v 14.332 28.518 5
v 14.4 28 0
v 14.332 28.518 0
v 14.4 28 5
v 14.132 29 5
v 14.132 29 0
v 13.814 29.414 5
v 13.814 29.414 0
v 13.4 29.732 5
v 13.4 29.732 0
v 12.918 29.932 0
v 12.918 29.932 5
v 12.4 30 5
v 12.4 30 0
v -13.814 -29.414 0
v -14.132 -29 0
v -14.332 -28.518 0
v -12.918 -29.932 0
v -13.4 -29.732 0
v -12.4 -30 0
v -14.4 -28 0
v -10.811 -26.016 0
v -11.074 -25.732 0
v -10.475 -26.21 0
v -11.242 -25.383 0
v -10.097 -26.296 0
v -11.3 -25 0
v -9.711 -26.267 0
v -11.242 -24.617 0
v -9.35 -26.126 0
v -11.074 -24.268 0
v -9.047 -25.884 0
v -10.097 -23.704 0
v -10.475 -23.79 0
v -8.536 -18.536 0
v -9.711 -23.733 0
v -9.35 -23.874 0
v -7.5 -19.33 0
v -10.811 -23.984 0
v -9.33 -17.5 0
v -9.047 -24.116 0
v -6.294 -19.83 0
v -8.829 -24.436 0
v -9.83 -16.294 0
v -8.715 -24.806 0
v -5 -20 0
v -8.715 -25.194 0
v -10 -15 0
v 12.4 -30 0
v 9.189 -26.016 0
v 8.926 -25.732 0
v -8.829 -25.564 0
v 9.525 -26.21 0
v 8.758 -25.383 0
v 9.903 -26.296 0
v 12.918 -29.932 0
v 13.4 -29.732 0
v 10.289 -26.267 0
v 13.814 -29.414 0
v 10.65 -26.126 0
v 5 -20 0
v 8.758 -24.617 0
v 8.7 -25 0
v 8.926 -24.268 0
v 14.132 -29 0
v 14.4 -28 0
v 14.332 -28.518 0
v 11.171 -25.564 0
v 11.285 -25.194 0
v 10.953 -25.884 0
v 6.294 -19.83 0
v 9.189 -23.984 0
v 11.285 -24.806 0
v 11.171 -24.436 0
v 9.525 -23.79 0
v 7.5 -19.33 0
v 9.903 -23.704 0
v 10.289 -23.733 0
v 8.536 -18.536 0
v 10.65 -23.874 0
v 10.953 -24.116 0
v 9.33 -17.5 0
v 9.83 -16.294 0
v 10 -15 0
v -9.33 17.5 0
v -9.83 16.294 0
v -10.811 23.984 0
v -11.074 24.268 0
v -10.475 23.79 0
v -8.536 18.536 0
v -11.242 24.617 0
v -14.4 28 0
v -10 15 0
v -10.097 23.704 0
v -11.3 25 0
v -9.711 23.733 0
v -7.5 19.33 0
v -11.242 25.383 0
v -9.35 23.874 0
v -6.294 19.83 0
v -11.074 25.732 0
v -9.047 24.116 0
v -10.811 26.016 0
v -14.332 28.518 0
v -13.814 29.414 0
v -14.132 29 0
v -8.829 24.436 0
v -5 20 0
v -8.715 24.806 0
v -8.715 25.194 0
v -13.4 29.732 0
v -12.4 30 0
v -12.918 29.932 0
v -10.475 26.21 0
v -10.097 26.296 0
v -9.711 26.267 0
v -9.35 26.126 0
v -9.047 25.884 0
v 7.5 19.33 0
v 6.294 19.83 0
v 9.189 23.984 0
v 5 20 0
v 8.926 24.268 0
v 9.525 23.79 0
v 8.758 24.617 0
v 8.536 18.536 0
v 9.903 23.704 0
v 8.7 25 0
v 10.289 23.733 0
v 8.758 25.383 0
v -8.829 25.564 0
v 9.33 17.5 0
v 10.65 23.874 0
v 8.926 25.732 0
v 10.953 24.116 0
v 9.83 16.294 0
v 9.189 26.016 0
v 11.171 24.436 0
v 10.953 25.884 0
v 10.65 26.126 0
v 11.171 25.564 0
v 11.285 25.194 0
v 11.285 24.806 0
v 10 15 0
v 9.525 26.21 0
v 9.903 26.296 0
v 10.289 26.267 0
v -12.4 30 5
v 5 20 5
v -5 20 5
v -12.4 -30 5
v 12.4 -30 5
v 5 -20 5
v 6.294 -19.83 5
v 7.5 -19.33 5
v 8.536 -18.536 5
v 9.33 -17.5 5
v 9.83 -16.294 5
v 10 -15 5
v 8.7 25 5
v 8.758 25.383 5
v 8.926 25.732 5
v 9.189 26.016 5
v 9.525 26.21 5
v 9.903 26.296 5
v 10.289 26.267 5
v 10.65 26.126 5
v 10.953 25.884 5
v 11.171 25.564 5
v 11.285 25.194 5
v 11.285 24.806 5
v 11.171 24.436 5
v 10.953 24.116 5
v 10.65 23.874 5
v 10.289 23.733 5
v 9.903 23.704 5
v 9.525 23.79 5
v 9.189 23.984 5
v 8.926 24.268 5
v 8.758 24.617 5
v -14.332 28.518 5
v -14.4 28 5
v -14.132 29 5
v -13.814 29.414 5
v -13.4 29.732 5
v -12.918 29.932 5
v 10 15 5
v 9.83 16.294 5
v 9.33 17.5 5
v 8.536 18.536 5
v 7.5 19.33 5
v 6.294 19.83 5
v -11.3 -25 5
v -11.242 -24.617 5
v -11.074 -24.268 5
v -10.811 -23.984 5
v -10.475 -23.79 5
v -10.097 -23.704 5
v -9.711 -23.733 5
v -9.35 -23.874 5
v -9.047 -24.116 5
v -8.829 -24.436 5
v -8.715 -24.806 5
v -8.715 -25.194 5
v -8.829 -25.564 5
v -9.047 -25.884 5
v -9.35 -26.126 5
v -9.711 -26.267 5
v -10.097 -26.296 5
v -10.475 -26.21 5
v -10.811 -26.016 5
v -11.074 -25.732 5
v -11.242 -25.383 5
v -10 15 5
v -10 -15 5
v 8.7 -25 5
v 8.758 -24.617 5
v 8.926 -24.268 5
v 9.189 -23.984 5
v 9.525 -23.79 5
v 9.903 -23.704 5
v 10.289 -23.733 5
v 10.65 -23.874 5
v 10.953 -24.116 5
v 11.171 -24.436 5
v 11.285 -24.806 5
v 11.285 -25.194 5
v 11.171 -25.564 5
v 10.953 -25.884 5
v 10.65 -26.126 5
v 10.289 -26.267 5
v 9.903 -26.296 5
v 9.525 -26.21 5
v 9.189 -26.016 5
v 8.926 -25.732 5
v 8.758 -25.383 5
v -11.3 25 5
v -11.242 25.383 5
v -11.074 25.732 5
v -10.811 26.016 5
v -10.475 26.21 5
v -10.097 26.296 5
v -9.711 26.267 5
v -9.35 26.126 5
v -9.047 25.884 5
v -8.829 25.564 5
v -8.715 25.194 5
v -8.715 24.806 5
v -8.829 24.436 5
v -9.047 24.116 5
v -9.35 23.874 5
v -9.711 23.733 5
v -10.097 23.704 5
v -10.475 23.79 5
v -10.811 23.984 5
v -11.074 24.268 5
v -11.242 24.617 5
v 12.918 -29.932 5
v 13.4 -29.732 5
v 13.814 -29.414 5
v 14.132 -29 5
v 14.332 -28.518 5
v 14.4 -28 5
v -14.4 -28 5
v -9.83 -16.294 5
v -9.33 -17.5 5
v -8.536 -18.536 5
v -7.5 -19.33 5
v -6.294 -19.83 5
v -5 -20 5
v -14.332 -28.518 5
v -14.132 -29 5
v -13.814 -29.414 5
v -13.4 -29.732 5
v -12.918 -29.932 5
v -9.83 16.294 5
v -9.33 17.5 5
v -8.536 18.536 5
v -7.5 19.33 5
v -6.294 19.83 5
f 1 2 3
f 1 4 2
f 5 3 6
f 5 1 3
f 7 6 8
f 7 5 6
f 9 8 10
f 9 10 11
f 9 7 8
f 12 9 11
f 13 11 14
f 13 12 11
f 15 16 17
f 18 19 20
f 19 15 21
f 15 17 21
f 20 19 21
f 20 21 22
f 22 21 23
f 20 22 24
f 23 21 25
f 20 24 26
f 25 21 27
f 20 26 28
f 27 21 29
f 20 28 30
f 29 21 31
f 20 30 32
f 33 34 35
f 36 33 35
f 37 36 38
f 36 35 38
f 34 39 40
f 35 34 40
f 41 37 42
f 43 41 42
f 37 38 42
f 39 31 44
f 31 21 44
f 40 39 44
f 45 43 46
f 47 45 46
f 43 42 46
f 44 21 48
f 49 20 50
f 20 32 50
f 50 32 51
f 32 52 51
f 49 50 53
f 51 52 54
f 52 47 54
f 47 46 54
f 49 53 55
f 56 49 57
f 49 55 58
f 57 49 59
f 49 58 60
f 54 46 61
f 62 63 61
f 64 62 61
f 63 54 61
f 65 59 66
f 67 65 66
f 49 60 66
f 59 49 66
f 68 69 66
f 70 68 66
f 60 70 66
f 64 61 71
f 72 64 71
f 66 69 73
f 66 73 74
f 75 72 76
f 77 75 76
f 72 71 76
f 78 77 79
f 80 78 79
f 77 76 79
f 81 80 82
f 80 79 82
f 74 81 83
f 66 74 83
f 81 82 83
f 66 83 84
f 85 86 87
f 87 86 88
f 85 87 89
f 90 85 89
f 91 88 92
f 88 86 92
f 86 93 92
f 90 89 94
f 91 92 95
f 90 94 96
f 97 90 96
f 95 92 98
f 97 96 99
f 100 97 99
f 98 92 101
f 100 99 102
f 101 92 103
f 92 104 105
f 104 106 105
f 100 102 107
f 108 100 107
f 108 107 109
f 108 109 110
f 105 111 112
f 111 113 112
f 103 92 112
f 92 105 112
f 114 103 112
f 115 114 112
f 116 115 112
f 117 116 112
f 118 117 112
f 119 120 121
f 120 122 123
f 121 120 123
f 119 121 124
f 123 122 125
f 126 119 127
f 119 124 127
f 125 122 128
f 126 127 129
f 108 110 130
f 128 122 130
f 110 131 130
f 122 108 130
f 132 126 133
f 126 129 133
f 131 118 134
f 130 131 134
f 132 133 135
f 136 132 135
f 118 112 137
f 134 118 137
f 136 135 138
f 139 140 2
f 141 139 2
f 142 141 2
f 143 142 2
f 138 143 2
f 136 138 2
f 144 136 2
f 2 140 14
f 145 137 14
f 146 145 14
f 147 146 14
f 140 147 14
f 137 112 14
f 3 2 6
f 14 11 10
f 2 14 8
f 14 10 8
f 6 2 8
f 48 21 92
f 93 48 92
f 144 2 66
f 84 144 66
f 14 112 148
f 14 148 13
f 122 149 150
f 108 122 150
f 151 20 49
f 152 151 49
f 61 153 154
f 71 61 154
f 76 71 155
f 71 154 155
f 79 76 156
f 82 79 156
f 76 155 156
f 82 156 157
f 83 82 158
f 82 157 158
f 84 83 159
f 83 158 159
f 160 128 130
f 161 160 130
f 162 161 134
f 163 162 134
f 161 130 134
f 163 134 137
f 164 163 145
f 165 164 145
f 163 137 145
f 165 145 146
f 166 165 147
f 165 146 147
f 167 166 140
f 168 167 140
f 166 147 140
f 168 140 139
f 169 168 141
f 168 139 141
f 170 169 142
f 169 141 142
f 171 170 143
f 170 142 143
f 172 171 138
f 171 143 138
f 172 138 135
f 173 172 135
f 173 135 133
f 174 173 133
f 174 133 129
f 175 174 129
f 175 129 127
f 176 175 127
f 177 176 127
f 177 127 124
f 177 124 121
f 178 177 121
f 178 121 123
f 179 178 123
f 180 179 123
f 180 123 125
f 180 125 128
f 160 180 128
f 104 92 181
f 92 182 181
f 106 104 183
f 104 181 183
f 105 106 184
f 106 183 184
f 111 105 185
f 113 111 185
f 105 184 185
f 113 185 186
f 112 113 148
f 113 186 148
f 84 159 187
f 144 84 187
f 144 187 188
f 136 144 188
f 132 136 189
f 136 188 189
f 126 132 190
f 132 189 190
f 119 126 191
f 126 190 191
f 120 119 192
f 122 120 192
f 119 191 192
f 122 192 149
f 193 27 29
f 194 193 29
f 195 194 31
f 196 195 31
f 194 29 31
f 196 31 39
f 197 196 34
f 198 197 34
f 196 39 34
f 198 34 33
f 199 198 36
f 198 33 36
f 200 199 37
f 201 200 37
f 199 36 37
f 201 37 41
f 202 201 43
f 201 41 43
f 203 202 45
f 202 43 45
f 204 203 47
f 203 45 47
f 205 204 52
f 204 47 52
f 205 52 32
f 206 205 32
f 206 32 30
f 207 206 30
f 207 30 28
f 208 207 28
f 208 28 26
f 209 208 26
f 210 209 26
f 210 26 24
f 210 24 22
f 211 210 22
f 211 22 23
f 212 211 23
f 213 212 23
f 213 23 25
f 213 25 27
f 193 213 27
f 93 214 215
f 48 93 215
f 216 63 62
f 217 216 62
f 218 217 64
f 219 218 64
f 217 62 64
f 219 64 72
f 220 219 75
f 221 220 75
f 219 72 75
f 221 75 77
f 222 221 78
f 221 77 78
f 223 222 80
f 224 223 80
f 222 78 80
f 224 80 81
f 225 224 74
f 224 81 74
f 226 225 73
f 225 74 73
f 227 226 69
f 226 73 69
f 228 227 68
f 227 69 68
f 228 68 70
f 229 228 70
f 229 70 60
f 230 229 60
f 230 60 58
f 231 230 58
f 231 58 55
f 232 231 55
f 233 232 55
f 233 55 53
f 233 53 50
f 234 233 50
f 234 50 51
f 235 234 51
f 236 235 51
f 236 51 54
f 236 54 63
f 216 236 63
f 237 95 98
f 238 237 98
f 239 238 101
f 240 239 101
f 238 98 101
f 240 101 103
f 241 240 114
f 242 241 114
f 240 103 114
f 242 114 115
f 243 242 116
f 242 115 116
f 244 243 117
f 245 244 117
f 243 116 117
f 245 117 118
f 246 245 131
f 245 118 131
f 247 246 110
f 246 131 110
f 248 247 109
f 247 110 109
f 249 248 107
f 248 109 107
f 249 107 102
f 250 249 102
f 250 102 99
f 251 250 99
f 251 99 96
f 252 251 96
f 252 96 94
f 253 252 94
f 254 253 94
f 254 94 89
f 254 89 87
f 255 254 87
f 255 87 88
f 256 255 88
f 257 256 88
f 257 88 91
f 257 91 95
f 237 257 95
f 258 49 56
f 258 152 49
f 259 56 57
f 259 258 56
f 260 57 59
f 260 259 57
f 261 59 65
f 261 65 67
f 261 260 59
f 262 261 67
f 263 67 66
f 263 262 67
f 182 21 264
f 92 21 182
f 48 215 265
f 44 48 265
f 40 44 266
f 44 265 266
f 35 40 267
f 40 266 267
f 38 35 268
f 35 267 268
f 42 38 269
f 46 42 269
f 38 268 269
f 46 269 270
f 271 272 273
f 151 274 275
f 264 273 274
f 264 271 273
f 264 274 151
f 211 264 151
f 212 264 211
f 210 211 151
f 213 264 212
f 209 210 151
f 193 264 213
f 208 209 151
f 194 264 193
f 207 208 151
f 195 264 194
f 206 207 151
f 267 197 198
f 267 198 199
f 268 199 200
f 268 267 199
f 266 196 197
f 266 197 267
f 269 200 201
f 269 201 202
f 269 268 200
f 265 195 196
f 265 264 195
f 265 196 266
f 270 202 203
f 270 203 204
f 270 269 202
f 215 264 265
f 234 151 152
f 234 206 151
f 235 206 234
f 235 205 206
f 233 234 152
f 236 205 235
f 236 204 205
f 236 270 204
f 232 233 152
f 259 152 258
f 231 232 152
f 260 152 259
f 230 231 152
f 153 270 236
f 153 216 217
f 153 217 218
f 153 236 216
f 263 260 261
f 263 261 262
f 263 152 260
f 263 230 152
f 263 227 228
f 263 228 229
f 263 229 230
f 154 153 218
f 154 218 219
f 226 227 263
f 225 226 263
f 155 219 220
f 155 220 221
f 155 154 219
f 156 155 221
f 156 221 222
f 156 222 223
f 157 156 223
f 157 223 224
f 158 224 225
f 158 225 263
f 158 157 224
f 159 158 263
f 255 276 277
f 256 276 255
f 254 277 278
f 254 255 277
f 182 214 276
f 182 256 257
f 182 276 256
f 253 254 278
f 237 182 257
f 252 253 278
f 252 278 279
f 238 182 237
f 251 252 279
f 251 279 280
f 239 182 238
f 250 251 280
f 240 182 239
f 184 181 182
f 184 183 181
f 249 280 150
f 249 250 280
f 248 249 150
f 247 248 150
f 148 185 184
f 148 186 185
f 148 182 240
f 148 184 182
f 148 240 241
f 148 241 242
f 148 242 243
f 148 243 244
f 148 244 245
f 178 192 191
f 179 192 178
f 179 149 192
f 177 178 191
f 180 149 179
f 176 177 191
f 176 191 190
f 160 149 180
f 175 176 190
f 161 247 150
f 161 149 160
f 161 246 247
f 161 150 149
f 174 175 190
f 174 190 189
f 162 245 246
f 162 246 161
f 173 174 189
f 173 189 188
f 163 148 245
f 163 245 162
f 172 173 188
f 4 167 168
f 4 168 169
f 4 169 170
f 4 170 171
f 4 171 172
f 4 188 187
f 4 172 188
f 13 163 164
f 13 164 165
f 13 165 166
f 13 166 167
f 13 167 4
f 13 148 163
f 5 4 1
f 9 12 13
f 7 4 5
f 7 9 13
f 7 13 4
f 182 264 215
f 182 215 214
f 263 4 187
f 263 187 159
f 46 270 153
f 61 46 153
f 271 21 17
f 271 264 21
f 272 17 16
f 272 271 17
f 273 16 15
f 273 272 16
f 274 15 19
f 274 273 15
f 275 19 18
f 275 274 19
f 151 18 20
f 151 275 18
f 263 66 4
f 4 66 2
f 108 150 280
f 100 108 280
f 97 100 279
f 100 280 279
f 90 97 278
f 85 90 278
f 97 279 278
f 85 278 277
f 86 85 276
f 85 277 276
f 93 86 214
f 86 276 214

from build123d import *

# Parameters (mm, degrees)
SZKIC1_W                    = 28.8
SZKIC1_H                    = 60
DODANIE_WYCI_GNI_CIE1_DEPTH = 5
ZAOKR_GLENIE1_R             = 2
OTW_R_POD_RUB_M22_D         = 2.6
WYTNIJ_WYCI_GNI_CIE1_REACH  = 7


with BuildPart() as part:
    # Szkic1 → Dodanie-wyciągnięcie1 (new body)
    with BuildSketch(Plane.XY):
        Rectangle(SZKIC1_W, SZKIC1_H)
    extrude(amount=DODANIE_WYCI_GNI_CIE1_DEPTH)

    # Zaokrąglenie1
    zaokr_glenie1_edges = [part.edges().sort_by_distance(p)[0] for p in [
        (14.4, -30, 2.5),
        (-14.4, -30, 2.5),
        (-14.4, 30, 2.5),
        (14.4, 30, 2.5),
    ]]
    fillet(zaokr_glenie1_edges, radius=ZAOKR_GLENIE1_R)

    # Otwór pod śrubę M22 (through all)
    with Locations(Plane.XY.offset(5)):
        with Locations((10, 25), (10, -25), (-10, -25), (-10, 25)):
            Hole(OTW_R_POD_RUB_M22_D / 2)

    # Szkic7 → Wytnij-wyciągnięcie1 (cut, up to next)
    with BuildSketch(Plane.XY.offset(5), mode=Mode.PRIVATE) as wytnij_wyci_gni_cie1_sk1:
        with BuildLine():
            Line((5, 20), (-5, 20))
            ThreePointArc((-5, 20), (-8.535533906, 18.535533906), (-10, 15))
            Line((-10, 15), (-10, -15))
            ThreePointArc((-10, -15), (-8.535533906, -18.535533906), (-5, -20))
            Line((-5, -20), (5, -20))
            ThreePointArc((5, -20), (8.535533906, -18.535533906), (10, -15))
            Line((10, -15), (10, 15))
            ThreePointArc((10, 15), (8.535533906, 18.535533906), (5, 20))
        make_face()
    wytnij_wyci_gni_cie1_tool1 = extrude(wytnij_wyci_gni_cie1_sk1.sketch, amount=-WYTNIJ_WYCI_GNI_CIE1_REACH, mode=Mode.PRIVATE) & part.part
    add(wytnij_wyci_gni_cie1_tool1.solids().sort_by_distance((0, 0, 5))[0], mode=Mode.SUBTRACT)


solid = part.part
